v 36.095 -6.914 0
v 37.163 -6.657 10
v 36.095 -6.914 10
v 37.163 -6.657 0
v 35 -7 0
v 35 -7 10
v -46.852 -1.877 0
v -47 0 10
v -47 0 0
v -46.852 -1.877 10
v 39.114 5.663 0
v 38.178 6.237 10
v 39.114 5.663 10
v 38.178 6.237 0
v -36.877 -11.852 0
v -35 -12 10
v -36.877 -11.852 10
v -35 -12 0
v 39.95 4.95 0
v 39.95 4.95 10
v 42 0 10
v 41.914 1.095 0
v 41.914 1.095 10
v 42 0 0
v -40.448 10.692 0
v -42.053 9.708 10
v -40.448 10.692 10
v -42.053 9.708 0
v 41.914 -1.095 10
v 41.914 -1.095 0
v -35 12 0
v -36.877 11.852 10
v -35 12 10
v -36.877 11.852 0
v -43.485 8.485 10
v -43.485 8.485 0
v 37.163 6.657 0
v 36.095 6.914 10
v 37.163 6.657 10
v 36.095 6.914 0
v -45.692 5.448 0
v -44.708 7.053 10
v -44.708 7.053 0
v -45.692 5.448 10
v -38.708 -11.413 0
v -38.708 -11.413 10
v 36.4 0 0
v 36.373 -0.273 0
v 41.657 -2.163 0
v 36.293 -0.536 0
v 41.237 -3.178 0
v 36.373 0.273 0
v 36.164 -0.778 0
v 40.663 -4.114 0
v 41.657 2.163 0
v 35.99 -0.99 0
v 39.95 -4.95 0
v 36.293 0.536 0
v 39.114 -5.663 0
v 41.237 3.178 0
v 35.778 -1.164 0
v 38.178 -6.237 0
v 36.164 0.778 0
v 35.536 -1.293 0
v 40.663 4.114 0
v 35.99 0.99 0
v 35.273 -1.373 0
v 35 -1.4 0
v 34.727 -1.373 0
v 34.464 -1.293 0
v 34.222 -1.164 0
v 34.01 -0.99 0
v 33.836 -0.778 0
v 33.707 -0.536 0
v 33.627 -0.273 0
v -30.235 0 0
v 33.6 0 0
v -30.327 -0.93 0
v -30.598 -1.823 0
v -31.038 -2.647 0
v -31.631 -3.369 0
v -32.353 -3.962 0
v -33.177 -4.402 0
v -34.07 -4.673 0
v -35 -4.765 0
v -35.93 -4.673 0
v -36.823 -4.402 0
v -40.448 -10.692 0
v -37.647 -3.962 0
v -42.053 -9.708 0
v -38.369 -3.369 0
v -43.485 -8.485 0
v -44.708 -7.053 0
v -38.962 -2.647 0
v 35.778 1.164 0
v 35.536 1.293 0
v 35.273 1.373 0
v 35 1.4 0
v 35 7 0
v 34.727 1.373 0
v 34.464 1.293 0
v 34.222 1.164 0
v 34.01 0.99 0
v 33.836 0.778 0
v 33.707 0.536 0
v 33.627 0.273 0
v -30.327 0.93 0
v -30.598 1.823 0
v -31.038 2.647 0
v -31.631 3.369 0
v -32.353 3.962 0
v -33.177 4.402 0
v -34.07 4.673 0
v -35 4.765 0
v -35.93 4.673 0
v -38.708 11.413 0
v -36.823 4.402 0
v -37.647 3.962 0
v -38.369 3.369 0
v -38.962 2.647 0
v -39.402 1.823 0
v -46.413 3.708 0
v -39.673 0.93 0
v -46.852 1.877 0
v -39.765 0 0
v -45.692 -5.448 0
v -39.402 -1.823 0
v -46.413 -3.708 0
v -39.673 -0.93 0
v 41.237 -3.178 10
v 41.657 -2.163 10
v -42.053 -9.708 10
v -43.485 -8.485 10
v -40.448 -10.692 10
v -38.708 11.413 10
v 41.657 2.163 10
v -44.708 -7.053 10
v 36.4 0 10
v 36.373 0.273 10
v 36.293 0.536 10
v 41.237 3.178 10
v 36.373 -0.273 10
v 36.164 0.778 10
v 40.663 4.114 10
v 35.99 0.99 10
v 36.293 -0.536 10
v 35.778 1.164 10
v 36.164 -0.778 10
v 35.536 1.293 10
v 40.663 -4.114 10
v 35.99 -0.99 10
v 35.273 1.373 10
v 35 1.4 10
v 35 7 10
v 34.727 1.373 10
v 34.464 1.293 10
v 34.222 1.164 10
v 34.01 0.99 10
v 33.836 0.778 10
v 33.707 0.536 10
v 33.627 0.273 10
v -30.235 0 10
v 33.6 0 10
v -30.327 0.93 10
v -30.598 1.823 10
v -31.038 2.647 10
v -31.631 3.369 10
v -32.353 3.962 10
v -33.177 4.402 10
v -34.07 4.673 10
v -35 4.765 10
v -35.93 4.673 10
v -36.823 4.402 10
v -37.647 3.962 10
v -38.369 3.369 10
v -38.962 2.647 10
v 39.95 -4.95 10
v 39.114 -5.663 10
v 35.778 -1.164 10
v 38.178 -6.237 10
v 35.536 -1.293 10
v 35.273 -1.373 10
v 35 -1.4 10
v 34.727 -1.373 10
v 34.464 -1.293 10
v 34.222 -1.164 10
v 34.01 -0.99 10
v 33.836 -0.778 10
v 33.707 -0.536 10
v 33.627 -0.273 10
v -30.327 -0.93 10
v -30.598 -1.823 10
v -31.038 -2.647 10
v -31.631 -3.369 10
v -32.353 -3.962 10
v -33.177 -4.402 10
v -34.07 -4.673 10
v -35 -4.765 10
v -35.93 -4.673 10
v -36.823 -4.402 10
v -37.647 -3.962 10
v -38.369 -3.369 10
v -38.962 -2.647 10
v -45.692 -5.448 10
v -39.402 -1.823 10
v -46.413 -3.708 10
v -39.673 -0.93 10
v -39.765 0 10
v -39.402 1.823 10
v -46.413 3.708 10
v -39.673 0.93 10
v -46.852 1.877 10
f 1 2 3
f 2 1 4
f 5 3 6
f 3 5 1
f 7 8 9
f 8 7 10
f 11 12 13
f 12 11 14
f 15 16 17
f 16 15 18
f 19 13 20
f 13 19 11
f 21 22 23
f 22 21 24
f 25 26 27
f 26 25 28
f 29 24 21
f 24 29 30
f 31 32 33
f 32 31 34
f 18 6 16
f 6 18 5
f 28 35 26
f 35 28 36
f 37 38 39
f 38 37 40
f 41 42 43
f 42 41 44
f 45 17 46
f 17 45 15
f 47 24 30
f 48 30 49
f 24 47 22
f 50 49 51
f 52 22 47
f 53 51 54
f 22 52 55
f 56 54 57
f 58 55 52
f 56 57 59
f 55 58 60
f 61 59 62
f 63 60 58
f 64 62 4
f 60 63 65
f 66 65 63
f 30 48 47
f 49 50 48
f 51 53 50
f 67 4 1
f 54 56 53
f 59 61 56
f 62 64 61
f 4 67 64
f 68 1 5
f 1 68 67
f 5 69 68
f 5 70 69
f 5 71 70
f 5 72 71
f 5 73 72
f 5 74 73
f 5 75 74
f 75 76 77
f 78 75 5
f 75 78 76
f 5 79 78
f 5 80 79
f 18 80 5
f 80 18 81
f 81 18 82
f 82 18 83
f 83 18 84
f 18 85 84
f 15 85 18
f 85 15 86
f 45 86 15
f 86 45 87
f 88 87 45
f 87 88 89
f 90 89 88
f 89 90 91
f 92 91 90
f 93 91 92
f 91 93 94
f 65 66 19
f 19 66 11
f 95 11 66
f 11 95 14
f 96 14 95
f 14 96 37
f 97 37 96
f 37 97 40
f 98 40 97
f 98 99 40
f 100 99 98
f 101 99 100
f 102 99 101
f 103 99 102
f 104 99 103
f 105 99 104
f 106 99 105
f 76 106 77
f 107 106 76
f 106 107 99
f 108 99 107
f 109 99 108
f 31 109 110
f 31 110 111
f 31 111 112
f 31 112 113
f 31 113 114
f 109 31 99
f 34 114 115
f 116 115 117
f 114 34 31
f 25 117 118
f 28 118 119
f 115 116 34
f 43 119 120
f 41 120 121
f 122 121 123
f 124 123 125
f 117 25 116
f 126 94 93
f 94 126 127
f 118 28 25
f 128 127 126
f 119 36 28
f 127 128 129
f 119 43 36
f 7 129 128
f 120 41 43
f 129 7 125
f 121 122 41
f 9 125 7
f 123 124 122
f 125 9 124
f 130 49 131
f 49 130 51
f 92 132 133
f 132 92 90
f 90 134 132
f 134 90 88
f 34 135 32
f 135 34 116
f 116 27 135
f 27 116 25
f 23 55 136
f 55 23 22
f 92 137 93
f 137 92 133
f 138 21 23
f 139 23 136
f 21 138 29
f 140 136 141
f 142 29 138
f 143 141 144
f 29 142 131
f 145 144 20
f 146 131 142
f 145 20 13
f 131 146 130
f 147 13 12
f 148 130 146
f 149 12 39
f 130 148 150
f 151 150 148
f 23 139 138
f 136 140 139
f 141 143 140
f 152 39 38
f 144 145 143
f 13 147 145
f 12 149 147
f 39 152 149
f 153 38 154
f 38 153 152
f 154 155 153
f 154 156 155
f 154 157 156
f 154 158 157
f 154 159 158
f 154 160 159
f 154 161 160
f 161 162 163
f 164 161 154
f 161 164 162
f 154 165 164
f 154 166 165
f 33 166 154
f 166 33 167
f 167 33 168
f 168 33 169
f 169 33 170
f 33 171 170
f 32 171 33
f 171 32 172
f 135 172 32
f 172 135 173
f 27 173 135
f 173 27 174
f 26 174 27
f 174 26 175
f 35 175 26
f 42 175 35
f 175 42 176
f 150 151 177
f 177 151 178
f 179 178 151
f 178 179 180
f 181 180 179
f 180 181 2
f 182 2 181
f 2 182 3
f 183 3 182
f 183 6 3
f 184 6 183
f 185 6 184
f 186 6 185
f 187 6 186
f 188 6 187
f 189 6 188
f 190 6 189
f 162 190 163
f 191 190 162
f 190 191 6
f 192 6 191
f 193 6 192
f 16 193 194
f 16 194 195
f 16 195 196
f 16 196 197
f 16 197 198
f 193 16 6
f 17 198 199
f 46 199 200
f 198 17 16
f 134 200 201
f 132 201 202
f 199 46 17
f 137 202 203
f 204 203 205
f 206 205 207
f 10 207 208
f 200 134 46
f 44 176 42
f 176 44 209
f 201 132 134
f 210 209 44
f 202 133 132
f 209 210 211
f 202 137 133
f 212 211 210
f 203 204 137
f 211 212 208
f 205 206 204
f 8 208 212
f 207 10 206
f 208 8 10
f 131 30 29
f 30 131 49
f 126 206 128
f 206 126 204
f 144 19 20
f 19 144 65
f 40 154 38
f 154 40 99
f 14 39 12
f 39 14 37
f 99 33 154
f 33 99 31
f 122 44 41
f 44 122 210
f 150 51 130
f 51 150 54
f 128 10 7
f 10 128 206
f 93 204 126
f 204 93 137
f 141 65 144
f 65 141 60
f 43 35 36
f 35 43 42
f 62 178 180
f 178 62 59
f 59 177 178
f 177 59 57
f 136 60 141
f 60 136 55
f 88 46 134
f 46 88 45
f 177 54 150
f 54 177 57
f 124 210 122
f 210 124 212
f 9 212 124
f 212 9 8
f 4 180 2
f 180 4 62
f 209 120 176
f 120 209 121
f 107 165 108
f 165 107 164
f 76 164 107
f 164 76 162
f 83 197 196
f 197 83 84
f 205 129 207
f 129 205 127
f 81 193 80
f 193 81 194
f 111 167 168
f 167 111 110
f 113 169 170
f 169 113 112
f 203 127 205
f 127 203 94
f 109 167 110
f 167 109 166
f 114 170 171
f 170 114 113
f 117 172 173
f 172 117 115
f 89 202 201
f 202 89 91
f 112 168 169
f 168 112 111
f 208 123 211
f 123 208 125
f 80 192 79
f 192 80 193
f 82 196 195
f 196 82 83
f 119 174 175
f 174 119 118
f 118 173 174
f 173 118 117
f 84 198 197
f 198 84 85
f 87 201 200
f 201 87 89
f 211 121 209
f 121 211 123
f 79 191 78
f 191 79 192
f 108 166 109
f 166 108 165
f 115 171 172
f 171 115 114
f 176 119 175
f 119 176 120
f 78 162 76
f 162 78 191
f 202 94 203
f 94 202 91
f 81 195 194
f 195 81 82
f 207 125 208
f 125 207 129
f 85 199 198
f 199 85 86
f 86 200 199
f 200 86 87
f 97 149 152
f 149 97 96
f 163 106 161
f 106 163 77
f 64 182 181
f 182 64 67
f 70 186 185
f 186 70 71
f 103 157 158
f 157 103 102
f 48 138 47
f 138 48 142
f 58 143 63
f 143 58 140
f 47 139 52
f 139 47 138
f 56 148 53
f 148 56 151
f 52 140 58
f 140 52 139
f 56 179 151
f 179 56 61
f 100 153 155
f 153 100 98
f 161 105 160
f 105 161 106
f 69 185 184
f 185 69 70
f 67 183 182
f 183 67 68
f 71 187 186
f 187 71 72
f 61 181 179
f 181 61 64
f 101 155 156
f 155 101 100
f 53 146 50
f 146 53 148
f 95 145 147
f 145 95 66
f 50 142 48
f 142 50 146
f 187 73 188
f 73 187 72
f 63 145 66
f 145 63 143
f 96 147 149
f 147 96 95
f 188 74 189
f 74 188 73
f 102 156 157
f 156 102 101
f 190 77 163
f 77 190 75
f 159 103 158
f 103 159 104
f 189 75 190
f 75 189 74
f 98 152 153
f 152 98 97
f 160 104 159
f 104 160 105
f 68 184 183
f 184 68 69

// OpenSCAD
$fn = 32;

// ----------------------------------------------------------------------
// Lever: 70 mm between the bosses, 10 mm thick, smooth outline
// ----------------------------------------------------------------------

// --- parameters (mm) ---
lever_l = 70;             // distance between the boss centres
boss_a = 24;              // first boss diameter
boss_b = 14;              // second boss diameter
bore_a = 9.53;            // first bore
bore_b = 2.8;             // second bore
lever_t = 10;             // lever thickness

lever_profile = [[-47, 0], [-46.852, -1.877], [-46.413, -3.708], [-45.692, -5.448], [-44.708, -7.053], [-43.485, -8.485], [-42.053, -9.708], [-40.448, -10.692], [-38.708, -11.413], [-36.877, -11.852], [-35, -12], [35, -7], [36.095, -6.914], [37.163, -6.657], [38.178, -6.237], [39.114, -5.663], [39.95, -4.95], [40.663, -4.114], [41.237, -3.178], [41.657, -2.163], [41.914, -1.095], [42, 0], [41.914, 1.095], [41.657, 2.163], [41.237, 3.178], [40.663, 4.114], [39.95, 4.95], [39.114, 5.663], [38.178, 6.237], [37.163, 6.657], [36.095, 6.914], [35, 7], [-35, 12], [-36.877, 11.852], [-38.708, 11.413], [-40.448, 10.692], [-42.053, 9.708], [-43.485, 8.485], [-44.708, 7.053], [-45.692, 5.448], [-46.413, 3.708], [-46.852, 1.877]];

difference() {
  linear_extrude(height = lever_t) polygon(lever_profile);
  translate([-35, 0, -2.5]) cylinder(h = lever_t + 5, d = bore_a);
  translate([35, 0, -2.5]) cylinder(h = lever_t + 5, d = bore_b);
}
